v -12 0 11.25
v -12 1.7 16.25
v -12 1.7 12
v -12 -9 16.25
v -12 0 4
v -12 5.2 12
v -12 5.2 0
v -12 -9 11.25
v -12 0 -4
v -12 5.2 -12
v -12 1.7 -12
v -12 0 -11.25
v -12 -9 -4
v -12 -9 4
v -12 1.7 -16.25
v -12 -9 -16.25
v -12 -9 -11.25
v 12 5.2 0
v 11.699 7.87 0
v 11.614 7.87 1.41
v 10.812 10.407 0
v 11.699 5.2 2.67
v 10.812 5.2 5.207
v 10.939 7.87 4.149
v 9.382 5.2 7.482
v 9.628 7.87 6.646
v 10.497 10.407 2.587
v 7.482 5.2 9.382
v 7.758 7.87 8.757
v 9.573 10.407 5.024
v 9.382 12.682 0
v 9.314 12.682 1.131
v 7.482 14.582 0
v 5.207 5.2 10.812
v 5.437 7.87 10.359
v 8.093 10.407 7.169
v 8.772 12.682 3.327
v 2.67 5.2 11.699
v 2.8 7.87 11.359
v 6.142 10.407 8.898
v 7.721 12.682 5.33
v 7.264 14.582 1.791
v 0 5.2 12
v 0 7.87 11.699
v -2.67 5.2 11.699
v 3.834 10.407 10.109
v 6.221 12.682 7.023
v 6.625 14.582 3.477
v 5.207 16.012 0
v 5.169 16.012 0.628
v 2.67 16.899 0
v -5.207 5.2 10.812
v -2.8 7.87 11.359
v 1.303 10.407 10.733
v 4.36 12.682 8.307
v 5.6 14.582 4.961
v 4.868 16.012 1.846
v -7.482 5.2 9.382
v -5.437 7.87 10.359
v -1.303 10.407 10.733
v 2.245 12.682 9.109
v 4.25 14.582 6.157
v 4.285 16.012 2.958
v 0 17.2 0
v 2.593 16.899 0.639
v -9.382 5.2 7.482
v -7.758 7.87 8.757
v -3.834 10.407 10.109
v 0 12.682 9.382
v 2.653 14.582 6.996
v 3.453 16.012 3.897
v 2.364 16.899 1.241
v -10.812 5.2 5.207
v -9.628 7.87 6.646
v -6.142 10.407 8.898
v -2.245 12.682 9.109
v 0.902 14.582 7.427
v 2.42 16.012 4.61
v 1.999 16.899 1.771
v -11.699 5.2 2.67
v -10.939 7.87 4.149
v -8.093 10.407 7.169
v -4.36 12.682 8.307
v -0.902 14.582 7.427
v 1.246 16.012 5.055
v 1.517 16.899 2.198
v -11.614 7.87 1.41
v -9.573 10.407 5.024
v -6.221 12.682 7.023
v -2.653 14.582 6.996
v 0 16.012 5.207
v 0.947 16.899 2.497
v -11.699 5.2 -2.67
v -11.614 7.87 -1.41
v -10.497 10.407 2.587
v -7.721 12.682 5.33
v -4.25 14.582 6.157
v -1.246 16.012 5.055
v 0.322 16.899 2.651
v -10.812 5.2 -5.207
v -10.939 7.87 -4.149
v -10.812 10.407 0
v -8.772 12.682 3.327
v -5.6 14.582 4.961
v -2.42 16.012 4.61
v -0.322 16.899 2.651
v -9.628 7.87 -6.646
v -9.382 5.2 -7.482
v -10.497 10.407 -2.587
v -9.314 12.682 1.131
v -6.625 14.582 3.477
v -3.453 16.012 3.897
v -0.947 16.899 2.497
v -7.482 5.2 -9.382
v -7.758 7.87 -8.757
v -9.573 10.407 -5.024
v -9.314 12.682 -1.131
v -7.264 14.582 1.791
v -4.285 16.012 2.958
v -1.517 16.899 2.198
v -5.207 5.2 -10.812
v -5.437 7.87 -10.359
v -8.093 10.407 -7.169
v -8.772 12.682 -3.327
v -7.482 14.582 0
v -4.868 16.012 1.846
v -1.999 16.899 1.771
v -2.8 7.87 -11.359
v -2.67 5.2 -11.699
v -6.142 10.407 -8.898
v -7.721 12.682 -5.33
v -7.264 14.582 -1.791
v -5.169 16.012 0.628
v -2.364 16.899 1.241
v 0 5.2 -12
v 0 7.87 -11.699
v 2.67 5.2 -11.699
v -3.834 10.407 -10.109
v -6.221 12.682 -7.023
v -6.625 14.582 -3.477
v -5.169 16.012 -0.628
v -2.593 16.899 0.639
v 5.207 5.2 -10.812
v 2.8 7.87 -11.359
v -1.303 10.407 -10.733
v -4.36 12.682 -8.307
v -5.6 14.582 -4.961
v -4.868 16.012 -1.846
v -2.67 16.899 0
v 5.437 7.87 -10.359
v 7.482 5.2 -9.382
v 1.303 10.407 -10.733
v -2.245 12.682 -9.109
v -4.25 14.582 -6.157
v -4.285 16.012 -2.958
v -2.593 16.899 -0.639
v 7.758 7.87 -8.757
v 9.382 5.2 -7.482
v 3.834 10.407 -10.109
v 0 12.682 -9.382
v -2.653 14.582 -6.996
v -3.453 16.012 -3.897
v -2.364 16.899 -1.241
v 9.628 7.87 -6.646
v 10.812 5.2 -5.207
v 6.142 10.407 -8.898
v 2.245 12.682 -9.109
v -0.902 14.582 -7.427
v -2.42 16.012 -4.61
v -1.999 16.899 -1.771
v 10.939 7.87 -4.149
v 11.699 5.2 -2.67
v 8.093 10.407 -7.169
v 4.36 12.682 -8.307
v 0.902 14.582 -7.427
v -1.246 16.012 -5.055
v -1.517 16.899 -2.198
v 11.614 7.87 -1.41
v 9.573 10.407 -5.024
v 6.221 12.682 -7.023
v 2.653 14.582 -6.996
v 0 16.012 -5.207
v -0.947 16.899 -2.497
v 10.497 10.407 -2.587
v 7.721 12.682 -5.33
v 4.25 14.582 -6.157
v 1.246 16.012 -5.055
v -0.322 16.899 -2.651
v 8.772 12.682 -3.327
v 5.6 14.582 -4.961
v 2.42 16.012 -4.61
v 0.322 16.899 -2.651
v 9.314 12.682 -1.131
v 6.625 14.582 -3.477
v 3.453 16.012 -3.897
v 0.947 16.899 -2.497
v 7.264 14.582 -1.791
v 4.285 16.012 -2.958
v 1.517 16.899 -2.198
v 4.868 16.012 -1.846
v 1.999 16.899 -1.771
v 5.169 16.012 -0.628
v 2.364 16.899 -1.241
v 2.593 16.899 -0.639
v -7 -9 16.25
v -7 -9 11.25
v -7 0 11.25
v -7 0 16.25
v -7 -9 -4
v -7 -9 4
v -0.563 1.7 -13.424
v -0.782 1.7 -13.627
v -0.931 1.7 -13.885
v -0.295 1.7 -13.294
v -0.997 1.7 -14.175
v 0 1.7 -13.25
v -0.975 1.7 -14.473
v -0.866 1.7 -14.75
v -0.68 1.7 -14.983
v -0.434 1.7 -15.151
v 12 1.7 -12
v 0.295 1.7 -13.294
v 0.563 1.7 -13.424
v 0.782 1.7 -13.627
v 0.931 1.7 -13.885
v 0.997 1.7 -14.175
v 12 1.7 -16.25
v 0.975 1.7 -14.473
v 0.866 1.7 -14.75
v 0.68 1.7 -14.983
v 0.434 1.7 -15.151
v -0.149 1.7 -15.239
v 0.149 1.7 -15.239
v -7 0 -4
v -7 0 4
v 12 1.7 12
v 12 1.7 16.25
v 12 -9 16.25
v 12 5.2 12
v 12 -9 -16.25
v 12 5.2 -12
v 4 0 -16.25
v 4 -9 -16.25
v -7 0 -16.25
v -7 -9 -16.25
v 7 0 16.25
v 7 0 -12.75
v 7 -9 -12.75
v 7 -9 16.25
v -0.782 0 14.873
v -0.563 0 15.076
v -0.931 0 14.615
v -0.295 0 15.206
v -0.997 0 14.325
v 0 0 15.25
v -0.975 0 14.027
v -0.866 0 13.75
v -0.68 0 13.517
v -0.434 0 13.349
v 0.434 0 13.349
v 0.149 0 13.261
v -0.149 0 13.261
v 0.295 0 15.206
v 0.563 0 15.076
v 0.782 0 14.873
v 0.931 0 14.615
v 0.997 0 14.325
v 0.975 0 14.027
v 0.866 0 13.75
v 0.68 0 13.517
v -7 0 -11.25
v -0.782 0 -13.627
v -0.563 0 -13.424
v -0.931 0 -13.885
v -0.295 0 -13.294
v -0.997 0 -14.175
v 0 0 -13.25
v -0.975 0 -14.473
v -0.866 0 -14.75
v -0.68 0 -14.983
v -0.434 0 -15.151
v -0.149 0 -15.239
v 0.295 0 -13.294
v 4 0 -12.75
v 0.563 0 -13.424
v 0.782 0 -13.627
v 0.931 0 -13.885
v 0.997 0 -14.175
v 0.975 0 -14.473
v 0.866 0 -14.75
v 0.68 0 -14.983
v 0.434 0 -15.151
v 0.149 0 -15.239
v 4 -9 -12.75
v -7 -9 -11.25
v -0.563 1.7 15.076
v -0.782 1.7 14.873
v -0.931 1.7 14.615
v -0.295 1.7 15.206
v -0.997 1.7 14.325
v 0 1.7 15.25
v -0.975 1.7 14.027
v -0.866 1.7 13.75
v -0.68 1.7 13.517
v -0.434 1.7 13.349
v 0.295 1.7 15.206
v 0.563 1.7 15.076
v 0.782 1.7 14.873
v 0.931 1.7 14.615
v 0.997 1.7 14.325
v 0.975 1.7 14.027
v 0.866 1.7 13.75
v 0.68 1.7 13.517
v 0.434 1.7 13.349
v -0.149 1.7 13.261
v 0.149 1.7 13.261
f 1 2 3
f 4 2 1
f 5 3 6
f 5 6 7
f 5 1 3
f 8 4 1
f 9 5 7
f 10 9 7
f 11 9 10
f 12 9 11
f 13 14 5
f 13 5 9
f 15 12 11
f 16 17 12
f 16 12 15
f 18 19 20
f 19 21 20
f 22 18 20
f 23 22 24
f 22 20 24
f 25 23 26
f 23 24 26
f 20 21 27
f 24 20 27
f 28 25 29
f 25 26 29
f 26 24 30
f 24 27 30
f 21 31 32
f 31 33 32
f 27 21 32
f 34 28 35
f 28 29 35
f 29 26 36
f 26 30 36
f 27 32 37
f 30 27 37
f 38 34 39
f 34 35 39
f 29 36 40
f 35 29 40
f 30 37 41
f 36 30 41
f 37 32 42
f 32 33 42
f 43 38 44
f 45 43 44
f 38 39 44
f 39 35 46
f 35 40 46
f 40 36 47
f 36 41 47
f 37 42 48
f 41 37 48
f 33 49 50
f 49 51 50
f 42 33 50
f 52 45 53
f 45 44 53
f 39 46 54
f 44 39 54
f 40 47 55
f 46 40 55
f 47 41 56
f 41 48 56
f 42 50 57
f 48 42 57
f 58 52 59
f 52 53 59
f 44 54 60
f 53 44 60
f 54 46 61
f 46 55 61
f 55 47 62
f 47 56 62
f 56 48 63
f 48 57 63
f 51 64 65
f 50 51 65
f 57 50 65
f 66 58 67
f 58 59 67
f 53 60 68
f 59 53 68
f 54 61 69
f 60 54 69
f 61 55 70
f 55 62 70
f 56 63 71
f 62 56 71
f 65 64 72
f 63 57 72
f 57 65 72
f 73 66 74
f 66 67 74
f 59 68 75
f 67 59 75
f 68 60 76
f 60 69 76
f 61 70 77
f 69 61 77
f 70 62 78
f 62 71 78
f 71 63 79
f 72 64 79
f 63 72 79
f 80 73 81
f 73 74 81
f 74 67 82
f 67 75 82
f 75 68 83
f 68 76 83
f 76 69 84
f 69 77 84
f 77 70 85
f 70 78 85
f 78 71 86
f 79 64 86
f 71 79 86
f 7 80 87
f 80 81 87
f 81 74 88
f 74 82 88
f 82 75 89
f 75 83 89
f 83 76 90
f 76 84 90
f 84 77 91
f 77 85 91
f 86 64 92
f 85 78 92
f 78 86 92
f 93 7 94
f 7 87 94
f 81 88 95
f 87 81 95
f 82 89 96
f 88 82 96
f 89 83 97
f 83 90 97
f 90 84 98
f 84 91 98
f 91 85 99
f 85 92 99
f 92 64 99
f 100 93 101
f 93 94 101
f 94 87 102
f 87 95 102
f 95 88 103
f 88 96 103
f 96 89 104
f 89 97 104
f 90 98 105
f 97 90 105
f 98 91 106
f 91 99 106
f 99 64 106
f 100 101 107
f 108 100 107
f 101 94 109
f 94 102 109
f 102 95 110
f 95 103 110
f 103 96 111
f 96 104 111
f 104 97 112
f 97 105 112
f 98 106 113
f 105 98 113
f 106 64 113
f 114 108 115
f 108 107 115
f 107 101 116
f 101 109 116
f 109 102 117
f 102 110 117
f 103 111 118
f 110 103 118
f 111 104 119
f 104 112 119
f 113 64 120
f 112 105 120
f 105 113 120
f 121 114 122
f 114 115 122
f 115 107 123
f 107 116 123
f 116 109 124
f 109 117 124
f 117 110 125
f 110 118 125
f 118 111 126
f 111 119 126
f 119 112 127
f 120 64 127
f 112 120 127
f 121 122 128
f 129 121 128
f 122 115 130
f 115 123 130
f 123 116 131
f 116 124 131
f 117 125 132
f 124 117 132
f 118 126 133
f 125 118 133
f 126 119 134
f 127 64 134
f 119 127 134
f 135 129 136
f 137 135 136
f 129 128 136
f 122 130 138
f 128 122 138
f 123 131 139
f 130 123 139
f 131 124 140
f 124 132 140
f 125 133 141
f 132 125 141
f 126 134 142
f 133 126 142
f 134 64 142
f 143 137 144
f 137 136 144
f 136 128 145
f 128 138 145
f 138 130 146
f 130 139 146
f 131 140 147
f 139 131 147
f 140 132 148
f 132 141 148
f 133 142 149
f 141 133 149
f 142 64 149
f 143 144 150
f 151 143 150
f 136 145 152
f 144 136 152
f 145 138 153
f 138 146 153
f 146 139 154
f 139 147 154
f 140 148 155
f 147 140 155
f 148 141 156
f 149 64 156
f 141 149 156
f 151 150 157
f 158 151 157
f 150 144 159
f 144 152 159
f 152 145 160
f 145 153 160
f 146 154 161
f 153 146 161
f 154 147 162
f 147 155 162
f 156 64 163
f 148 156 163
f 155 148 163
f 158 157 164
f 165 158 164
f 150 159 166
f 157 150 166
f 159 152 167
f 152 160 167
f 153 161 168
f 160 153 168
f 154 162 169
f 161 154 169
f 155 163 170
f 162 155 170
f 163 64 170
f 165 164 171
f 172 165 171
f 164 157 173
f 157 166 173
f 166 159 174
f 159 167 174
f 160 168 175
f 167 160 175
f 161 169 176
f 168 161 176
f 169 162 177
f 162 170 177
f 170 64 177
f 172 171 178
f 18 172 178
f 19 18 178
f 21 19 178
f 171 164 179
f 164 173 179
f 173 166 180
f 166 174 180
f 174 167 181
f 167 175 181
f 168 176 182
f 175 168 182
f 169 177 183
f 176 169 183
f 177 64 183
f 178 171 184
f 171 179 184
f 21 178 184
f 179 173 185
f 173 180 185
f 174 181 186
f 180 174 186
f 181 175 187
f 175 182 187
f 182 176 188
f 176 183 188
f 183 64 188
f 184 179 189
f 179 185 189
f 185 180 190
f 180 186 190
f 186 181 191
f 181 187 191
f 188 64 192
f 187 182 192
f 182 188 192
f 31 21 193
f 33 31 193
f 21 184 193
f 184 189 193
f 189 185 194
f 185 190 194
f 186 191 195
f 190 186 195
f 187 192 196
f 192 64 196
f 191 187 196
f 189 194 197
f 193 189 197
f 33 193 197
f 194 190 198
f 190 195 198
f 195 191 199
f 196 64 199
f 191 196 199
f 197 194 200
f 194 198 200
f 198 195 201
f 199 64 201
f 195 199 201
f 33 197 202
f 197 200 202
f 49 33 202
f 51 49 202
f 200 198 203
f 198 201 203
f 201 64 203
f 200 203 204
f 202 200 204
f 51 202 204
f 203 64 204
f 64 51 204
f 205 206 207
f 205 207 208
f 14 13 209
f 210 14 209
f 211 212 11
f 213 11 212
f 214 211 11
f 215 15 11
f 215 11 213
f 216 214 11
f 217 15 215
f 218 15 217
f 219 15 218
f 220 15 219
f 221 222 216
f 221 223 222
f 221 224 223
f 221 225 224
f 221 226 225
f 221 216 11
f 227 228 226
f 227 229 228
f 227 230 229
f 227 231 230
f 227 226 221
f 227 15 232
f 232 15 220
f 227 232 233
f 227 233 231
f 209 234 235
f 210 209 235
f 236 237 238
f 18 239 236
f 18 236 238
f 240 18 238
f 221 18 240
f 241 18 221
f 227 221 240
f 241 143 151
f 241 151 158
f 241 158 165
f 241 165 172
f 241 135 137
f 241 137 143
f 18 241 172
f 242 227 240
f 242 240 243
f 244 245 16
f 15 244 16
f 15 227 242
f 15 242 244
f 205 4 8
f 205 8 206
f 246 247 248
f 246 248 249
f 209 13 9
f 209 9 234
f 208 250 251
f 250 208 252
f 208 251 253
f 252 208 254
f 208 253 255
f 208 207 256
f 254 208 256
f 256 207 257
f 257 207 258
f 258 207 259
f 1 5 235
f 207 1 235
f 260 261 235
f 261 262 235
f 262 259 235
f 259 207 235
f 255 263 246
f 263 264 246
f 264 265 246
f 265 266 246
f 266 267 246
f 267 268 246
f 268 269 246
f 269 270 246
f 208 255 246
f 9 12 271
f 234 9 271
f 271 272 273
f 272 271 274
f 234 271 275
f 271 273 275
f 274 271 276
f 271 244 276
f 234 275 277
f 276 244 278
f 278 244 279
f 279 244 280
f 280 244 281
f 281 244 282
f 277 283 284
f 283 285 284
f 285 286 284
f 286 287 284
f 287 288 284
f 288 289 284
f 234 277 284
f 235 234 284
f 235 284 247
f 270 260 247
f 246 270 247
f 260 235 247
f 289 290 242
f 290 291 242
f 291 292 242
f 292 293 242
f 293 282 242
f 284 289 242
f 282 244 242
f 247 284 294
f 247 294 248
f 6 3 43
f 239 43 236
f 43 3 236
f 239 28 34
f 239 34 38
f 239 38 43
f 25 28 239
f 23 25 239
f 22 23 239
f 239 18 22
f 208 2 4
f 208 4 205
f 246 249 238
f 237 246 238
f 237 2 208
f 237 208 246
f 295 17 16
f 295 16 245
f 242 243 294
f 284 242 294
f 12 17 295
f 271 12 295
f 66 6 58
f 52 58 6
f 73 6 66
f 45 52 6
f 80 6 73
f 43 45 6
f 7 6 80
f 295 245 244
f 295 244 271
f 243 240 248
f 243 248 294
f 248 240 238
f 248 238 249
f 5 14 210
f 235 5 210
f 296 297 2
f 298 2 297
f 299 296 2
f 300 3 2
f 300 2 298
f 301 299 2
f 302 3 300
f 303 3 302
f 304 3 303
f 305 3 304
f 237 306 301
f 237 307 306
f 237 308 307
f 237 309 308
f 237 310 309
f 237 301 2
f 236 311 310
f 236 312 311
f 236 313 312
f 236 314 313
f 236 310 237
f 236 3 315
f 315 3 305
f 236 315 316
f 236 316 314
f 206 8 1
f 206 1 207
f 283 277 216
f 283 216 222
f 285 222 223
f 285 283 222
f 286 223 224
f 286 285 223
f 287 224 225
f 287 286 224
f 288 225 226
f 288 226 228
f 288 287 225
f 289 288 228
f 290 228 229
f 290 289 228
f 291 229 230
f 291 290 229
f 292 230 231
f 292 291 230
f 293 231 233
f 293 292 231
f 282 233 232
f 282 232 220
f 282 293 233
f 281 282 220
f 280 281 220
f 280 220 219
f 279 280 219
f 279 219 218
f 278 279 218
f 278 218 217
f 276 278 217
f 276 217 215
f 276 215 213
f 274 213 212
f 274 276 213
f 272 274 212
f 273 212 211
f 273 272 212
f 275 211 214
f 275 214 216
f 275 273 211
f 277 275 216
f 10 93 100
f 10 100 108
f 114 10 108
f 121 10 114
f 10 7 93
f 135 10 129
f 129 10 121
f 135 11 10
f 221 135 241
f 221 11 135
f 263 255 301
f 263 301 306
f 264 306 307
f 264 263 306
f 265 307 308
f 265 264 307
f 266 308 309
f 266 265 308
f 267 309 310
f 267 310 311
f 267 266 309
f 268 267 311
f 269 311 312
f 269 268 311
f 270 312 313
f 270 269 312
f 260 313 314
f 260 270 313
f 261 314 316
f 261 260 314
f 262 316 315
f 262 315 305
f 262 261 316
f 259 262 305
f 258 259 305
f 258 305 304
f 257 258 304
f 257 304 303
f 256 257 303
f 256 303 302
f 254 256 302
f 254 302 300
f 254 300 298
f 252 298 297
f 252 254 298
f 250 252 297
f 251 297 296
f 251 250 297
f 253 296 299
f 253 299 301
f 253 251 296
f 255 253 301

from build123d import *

# Parameters (mm, degrees)
SKETCH1_W           = 24
SKETCH1_H           = 32.5
SKETCH1_R           = 1
BOSS_EXTRUDE1_DEPTH = 1.7
SKETCH2_W           = 24
SKETCH2_H           = 24
BOSS_EXTRUDE2_DEPTH = 3.5
SKETCH4_W           = 5
SKETCH4_H           = 5
SKETCH4_H_2         = 8
BOSS_EXTRUDE3_DEPTH = 9


with BuildPart() as part:
    # Sketch1 → Boss-Extrude1 (new body)
    with BuildSketch(Plane(origin=(0, 0, 0), x_dir=(1, 0, 0), z_dir=(0, 1, 0))):
        Rectangle(SKETCH1_W, SKETCH1_H)
        with Locations(Location((0, 14.25, 0), (0, 0, 270))):
            Circle(SKETCH1_R, mode=Mode.SUBTRACT)
        with Locations(Location((0, -14.25, 0), (0, 0, 270))):
            Circle(SKETCH1_R, mode=Mode.SUBTRACT)
    extrude(amount=BOSS_EXTRUDE1_DEPTH)

    # Sketch2 → Boss-Extrude2 (add)
    with BuildSketch(Plane(origin=(0, 1.7, 0), x_dir=(1, 0, 0), z_dir=(0, 1, 0))):
        Rectangle(SKETCH2_W, SKETCH2_H)
    extrude(amount=BOSS_EXTRUDE2_DEPTH)

    # Sketch3 → Revolve1 (revolve)
    with BuildSketch(Plane.XY):
        with BuildLine():
            Line((0, 17.2), (0, 5.2))
            Line((0, 5.2), (12, 5.2))
            ThreePointArc((12, 5.2), (8.485281374, 13.685281374), (0, 17.2))
        make_face()
    revolve(axis=Axis((0, 17.2, 0), (0, -1, 0)))

    # Sketch4 → Boss-Extrude3 (add)
    with BuildSketch(Plane.XZ):
        Polygon((7, 16.25), (12, 16.25), (12, -16.25), (4, -16.25), (4, -12.75), (7, -12.75), align=None)
        with Locations((-9.5, 13.75)):
            Rectangle(SKETCH4_W, SKETCH4_H)
        with Locations((-9.5, -13.75)):
            Rectangle(SKETCH4_W, SKETCH4_H)
        with Locations((-9.5, 0)):
            Rectangle(SKETCH4_W, SKETCH4_H_2)
    extrude(amount=BOSS_EXTRUDE3_DEPTH)


solid = part.part
